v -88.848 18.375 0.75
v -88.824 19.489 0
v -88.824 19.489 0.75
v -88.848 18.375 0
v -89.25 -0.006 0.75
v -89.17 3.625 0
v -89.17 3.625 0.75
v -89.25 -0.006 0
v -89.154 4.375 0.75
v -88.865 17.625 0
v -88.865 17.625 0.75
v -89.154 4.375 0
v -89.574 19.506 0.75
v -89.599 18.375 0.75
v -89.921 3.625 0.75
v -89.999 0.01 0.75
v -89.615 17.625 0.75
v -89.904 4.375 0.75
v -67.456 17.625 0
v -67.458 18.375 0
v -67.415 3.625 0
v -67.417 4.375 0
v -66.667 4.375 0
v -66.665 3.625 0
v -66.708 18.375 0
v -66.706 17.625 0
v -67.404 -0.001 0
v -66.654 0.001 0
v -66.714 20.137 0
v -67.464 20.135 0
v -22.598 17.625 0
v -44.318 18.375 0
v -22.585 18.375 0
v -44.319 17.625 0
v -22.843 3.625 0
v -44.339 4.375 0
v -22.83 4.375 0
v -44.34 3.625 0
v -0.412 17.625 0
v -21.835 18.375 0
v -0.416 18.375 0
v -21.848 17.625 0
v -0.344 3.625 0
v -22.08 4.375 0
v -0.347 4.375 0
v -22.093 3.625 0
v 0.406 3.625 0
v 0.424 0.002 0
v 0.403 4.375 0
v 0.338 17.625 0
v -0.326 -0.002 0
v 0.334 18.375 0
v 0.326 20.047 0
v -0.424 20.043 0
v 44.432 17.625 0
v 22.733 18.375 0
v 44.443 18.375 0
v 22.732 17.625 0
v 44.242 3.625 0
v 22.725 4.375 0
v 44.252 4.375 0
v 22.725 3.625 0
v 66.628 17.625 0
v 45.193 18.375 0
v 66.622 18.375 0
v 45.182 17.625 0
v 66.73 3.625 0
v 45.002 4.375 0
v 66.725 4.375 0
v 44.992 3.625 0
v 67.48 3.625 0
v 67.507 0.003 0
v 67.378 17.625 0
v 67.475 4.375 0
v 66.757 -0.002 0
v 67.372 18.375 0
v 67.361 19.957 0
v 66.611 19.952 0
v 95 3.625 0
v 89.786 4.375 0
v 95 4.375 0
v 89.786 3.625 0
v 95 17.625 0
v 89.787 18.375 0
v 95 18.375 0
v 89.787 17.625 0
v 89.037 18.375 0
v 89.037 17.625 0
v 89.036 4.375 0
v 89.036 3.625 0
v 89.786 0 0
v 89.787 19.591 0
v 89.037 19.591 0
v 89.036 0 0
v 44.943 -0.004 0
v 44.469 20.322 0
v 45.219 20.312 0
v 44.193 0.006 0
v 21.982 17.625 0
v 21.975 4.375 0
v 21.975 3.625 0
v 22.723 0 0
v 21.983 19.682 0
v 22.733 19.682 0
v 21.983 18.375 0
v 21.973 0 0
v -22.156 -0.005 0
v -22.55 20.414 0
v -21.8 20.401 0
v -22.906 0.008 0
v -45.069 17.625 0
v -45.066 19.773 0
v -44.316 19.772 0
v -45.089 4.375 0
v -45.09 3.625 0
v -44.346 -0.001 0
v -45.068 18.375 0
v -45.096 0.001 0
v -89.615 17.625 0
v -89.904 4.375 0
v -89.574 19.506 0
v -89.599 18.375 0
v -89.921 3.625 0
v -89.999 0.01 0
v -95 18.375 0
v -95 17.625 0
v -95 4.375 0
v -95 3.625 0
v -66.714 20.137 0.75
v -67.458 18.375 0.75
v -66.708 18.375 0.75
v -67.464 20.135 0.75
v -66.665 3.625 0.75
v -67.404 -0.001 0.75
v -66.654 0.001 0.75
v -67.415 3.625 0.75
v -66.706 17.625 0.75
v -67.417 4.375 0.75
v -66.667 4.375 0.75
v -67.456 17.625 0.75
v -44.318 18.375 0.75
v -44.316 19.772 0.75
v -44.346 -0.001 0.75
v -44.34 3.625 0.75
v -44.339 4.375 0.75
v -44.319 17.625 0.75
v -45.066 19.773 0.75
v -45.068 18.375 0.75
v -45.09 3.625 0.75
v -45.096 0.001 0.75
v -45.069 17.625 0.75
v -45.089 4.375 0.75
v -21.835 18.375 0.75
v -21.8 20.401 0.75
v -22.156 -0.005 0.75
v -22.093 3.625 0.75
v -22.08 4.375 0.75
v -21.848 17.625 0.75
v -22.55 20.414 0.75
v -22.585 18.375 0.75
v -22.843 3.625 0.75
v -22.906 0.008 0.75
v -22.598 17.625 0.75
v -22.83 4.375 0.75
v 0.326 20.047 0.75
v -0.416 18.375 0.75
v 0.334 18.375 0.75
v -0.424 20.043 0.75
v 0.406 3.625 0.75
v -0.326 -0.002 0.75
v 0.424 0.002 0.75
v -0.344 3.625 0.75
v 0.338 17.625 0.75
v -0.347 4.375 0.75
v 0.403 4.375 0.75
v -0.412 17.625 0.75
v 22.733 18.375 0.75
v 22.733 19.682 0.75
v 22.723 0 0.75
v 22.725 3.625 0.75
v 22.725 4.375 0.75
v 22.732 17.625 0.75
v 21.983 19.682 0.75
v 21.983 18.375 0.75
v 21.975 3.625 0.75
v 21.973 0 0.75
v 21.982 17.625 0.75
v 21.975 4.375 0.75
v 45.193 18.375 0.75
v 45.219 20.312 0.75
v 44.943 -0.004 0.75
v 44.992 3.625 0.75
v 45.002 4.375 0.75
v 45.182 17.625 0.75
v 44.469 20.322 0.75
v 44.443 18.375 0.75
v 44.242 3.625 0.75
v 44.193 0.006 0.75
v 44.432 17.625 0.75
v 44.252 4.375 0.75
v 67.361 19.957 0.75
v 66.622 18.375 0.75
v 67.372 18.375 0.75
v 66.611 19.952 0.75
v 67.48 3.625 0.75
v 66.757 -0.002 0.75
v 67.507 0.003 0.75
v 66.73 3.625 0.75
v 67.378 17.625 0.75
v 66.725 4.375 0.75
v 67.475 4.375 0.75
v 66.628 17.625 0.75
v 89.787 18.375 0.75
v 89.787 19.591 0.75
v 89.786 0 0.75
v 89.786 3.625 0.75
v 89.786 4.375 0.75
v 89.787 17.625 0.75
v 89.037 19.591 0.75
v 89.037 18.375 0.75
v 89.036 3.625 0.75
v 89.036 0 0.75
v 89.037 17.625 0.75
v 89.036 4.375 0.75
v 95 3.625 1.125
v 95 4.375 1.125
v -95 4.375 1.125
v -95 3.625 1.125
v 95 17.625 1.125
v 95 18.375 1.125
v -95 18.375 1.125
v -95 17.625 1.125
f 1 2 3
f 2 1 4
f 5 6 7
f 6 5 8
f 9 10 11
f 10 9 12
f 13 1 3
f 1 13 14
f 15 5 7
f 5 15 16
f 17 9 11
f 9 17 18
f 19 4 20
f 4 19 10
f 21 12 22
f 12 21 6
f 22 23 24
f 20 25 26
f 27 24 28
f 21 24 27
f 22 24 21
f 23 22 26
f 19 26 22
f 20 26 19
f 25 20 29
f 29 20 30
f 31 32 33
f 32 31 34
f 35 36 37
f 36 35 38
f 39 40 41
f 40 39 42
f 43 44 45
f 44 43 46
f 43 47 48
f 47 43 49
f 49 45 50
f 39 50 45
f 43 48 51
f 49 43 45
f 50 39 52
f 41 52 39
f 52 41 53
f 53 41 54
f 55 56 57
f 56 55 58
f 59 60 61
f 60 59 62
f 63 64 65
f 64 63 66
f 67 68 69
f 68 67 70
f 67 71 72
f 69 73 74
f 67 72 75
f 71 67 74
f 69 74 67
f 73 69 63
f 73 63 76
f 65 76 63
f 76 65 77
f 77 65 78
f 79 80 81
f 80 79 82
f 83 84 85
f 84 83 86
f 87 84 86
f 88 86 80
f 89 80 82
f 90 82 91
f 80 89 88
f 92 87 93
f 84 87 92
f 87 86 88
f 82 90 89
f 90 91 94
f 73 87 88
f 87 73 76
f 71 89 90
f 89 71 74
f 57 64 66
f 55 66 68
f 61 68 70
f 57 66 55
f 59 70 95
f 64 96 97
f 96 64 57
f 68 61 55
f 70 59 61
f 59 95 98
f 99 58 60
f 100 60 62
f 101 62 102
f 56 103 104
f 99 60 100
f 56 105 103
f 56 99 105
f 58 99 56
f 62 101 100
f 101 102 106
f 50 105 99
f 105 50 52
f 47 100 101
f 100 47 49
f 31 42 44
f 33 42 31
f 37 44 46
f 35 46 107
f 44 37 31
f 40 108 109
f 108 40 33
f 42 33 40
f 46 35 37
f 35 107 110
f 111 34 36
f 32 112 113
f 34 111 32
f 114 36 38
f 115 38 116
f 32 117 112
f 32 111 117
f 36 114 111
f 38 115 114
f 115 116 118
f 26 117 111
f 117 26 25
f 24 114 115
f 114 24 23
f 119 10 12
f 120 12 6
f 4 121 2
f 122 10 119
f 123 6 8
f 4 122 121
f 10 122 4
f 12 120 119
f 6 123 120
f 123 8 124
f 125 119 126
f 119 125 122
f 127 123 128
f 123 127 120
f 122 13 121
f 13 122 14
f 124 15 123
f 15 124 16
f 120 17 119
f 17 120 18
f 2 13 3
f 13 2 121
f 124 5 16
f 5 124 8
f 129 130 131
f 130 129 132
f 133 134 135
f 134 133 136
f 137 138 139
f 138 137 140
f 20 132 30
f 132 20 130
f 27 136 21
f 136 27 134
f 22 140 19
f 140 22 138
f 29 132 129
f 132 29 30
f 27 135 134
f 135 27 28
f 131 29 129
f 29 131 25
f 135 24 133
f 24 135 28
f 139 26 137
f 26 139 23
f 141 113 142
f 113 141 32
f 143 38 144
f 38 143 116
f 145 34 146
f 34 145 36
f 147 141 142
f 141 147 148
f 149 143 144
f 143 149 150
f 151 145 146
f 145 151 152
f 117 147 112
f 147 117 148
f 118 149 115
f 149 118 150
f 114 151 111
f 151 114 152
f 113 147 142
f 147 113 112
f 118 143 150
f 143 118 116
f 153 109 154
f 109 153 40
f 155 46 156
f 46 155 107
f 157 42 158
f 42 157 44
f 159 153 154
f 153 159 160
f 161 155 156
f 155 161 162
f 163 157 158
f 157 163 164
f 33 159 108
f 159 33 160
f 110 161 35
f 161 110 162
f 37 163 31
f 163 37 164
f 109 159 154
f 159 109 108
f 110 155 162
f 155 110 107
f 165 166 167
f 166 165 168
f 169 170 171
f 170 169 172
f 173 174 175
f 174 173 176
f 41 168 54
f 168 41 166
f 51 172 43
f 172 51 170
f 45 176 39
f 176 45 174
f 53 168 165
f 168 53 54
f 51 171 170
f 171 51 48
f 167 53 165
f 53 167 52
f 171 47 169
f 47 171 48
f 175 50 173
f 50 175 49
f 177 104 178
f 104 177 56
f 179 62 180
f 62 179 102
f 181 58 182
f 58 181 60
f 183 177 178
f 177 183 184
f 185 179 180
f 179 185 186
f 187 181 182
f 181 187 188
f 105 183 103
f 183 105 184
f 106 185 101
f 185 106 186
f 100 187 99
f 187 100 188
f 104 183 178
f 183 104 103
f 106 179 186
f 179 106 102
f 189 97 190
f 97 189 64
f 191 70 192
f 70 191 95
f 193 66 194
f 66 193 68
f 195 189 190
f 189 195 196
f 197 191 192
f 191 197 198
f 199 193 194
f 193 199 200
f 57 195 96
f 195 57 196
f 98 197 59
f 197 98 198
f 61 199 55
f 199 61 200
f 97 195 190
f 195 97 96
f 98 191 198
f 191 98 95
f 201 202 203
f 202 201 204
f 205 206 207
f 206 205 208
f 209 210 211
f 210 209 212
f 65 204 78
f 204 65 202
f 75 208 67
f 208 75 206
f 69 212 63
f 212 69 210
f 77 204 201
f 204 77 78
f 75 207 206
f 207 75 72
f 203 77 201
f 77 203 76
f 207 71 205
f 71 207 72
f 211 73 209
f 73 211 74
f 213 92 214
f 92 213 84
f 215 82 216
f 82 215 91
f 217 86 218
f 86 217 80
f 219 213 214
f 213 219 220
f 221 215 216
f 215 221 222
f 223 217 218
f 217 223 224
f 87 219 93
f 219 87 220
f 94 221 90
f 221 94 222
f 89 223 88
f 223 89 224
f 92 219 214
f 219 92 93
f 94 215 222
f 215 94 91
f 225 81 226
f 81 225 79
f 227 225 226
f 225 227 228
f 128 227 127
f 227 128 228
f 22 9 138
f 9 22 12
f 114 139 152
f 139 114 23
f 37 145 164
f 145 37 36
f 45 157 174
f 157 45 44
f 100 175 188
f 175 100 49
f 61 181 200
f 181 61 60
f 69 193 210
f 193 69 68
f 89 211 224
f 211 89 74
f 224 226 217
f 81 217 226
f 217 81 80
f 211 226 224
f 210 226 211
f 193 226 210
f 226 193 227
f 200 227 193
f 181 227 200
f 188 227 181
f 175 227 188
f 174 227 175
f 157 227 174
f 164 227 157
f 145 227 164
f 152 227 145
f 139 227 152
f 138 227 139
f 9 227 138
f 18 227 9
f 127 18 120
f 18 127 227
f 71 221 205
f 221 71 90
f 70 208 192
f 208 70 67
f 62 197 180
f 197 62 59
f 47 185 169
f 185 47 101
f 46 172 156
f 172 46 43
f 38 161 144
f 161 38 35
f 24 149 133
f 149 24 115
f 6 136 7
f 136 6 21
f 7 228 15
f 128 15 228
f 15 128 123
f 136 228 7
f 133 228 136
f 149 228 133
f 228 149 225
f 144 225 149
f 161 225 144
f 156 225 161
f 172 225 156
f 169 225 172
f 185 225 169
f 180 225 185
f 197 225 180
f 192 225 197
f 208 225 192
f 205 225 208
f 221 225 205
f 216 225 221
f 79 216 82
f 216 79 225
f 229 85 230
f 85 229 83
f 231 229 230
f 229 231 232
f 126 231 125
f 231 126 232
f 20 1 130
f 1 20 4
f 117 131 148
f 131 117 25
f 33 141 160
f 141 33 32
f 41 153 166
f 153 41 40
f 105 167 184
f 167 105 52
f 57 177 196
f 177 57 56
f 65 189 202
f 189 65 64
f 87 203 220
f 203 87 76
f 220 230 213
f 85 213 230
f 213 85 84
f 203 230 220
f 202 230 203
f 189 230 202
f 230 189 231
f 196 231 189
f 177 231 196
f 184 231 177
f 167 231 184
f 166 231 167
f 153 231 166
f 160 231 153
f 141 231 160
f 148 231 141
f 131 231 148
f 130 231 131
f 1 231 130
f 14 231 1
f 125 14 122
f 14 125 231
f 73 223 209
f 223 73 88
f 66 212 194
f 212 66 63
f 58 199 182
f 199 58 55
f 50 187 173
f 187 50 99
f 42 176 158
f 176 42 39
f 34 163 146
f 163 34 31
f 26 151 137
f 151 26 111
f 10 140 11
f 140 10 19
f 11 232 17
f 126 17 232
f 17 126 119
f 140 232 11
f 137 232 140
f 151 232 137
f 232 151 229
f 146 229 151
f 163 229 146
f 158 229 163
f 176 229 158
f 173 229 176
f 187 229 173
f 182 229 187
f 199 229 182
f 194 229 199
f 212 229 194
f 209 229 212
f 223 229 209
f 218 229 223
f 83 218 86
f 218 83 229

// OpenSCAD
// res: 0.15
// flow 120%

width = 190;
height = 20;
height_variant = 1;
rot_variant = 5;

distance = 25;

stick = 0.75;
hor = [0.2, 0.9];

number = ceil(width / distance);
for (i=[0:number]) {
    rnd = i * 7 % 11 / 11;
    rnd2_tmp = (i * 13 % 19 / 19) - .5;
    rnd2 = pow(rnd2_tmp, 2) * ((rnd2_tmp > 0) ? 1 : -1);
    x = ((i-.5) - ((number -1) / 2) ) * width / (number + .5);
    h = height + (rnd - .5) * height_variant;
    translate([x, h / 2, stick / 2]) rotate(rot_variant * rnd2)  cube ([stick, h, stick], true);
}
for(yr=hor) {
    y = height * yr;
    translate([0, y, stick * 0.75]) cube([width, stick, stick*1.5], true);

}
